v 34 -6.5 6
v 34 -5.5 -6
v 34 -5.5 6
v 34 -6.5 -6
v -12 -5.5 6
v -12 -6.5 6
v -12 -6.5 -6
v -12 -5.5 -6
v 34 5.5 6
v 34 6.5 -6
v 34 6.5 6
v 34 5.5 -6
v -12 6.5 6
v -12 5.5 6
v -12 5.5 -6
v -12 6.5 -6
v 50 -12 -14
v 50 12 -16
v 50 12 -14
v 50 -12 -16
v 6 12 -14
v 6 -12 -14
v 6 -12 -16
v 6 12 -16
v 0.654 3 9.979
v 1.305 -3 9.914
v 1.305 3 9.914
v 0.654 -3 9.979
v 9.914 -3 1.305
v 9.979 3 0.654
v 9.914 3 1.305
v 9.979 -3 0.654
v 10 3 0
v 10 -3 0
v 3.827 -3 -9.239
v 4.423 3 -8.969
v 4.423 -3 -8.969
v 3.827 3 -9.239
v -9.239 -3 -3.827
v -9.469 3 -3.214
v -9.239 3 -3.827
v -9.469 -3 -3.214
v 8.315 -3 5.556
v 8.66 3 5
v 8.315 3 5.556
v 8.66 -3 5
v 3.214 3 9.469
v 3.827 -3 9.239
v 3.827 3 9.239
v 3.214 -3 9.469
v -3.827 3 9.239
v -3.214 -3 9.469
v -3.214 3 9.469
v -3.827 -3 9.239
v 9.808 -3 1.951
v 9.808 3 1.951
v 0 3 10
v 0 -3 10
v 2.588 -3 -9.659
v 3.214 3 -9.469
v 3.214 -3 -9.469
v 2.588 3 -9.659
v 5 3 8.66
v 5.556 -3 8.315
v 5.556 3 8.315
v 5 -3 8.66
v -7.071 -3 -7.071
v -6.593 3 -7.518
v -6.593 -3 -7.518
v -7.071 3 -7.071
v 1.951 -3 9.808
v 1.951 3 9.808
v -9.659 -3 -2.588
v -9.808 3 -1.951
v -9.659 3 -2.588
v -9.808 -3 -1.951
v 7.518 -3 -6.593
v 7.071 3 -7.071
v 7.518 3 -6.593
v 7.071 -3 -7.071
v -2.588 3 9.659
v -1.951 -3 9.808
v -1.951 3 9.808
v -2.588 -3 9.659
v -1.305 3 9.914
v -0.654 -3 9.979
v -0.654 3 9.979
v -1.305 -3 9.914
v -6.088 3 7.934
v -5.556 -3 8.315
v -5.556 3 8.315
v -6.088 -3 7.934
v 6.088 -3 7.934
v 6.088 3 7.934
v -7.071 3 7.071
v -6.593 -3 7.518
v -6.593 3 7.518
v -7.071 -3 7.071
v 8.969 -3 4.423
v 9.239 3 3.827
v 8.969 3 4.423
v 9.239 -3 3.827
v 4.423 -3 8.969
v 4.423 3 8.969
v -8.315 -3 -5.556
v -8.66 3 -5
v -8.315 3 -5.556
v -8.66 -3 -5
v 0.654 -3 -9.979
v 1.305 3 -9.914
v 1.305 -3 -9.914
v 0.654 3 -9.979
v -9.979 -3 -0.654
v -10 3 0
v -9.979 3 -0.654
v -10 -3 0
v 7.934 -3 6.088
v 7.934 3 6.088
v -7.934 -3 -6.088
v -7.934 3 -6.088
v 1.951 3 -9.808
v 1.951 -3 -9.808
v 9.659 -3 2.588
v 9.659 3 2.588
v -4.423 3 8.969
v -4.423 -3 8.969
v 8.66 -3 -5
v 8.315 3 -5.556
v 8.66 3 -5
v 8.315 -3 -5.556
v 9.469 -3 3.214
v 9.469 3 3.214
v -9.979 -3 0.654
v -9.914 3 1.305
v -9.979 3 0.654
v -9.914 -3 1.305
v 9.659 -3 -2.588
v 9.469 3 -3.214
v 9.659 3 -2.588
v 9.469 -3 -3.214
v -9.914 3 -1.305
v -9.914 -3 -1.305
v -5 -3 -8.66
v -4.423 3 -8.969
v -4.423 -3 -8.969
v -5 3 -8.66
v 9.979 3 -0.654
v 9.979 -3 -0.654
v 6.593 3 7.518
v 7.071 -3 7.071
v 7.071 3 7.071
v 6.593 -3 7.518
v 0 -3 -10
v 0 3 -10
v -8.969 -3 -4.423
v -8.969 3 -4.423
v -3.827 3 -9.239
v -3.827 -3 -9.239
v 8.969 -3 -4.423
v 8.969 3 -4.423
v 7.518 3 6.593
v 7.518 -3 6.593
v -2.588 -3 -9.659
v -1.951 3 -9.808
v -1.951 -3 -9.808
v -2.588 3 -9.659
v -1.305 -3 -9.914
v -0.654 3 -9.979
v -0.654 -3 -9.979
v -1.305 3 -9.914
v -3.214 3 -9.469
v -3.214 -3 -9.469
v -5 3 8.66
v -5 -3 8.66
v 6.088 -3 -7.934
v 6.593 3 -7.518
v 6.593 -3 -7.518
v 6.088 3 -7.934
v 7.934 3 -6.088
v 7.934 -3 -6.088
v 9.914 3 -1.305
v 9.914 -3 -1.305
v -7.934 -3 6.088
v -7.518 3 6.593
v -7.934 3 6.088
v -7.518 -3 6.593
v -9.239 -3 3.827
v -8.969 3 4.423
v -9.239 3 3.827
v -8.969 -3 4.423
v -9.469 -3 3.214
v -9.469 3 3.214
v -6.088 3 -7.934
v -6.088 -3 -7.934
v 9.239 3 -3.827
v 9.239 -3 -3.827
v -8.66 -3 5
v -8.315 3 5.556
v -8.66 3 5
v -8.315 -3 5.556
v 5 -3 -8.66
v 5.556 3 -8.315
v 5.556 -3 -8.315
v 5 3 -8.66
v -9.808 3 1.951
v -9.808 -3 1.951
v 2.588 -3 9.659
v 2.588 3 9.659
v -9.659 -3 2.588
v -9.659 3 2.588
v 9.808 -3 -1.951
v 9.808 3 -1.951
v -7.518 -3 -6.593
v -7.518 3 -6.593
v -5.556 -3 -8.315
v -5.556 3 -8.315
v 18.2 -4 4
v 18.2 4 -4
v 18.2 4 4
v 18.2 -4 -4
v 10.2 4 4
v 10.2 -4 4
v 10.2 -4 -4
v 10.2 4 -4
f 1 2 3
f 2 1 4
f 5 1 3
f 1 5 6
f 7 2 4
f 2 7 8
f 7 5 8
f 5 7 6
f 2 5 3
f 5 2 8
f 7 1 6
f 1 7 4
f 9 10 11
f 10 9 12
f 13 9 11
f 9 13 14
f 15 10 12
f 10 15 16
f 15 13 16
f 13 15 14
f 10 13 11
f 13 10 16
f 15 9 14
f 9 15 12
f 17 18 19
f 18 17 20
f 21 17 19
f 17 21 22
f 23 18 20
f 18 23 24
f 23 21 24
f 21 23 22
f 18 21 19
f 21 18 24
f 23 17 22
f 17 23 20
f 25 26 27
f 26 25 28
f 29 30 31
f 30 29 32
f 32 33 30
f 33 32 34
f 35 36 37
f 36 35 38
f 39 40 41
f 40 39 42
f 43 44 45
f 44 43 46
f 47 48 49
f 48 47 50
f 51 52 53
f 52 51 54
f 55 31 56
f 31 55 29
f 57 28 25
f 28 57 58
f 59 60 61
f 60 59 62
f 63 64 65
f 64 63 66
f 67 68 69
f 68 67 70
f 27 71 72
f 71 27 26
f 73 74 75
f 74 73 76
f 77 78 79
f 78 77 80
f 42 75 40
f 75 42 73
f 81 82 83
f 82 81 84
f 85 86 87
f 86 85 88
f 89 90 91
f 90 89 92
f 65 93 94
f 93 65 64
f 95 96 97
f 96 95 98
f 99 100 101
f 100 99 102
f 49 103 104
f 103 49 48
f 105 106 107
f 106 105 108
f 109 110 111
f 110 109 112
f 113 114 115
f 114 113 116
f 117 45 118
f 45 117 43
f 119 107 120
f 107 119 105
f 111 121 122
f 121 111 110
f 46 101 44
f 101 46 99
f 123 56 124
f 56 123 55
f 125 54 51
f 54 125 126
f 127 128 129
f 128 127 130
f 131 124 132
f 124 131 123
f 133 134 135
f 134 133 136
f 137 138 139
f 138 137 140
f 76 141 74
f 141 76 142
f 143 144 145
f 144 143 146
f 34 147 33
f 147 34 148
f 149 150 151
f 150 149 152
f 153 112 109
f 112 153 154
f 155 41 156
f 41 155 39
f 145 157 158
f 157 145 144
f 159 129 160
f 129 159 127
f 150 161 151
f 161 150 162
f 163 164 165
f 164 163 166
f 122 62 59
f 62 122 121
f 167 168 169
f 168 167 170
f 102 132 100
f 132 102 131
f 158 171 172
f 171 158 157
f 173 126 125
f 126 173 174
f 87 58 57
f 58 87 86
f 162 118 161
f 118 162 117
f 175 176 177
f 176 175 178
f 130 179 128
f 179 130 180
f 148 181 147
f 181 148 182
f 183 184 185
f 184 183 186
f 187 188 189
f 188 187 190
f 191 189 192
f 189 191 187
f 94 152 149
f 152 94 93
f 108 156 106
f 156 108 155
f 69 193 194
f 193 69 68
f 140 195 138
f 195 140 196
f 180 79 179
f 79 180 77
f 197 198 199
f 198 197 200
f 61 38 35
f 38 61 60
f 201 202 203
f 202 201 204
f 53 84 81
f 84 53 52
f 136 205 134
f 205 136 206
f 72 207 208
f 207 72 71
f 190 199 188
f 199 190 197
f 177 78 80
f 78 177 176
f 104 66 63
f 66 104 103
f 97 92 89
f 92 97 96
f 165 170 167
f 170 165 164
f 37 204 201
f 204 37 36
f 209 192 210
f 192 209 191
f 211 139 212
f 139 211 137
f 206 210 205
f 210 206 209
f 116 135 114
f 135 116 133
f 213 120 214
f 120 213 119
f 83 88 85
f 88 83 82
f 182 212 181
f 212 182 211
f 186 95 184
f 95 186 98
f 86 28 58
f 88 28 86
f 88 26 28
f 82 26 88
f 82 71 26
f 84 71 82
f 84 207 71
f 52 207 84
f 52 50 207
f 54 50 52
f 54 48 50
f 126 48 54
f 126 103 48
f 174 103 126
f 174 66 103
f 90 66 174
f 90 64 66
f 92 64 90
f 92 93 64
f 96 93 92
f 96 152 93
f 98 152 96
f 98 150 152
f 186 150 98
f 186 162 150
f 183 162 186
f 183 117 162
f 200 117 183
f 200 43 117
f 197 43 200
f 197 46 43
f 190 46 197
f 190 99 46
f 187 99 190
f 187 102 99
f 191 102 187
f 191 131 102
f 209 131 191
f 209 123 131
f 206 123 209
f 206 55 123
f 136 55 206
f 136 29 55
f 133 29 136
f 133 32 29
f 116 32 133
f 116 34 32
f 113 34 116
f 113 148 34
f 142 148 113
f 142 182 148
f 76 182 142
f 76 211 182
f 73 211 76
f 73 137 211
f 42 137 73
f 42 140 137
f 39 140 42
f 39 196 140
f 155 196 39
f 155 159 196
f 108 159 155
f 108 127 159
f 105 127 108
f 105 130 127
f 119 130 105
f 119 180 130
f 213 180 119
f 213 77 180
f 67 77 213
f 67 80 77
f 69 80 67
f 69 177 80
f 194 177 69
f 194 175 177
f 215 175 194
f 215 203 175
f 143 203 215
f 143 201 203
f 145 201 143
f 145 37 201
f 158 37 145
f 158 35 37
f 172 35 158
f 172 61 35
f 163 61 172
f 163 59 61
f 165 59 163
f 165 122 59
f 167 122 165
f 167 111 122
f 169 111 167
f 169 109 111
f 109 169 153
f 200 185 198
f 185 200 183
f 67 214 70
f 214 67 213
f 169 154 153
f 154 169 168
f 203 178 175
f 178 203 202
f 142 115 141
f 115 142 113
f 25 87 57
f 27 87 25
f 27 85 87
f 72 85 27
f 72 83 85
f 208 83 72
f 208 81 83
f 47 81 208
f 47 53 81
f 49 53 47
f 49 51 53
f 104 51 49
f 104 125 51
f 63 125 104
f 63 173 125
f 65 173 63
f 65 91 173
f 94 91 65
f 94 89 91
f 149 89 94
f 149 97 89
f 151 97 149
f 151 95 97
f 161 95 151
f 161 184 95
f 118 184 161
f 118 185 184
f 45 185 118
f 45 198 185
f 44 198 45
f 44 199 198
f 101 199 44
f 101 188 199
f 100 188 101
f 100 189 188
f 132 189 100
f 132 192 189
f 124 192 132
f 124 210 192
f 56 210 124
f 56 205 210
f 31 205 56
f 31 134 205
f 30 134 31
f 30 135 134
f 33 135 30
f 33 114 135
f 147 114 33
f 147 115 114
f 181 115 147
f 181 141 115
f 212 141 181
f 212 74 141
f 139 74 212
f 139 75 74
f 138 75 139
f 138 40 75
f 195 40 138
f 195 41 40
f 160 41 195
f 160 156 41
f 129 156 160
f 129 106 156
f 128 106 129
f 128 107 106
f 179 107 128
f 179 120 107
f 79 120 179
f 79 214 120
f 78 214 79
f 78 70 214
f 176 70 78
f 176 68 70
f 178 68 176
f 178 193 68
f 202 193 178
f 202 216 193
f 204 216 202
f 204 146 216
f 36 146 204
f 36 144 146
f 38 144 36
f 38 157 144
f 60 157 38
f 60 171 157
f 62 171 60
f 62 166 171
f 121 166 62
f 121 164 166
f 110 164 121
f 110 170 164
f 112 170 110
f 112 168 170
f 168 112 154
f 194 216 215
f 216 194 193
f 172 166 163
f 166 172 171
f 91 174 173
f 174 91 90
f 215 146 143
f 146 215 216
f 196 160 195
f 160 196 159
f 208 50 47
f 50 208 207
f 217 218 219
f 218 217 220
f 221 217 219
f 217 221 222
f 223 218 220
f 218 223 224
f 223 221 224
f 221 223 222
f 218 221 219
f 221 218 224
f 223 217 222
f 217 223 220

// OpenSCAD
// Eccentric disk cam with a flat translating follower.
// Two-dimensional mechanism in the XZ plane; the cam rotates about +Y.
// The follower face is perpendicular to +X and moves along X.
cam_angle = 0;
agentscad_part = "all";
eccentricity = 0;
cam_radius = 10;
cam_thickness = 6;
follower_gap = 0.2;
follower_length = 8;
follower_width = 8;
follower_height = 8;
$fn = 96;

module frame_local() {
  // Base plate below the mechanism.
  translate([6, -12, -16]) cube([44, 24, 2]);
  // Two guide rails around the follower; they do not touch the cam.
  for (yy = [-6.5, 5.5]) translate([-12, yy, -6]) cube([46, 1, 12]);
}

module cam_local() {
  // Eccentric disk in the XZ plane; the shaft is omitted so the frame needs no bearing.
  rotate([90, 0, 0]) translate([eccentricity, 0, 0]) cylinder(r = cam_radius, h = cam_thickness, center = true);
}

module follower_local() {
  // Flat face at x = R + e cos(theta) + gap; block extends to +X.
  xpos = cam_radius + eccentricity * cos(cam_angle) + follower_gap;
  translate([xpos, -follower_width / 2, -follower_height / 2])
    cube([follower_length, follower_width, follower_height]);
}

module assembly() {
  if (agentscad_part == "all" || agentscad_part == "frame") frame_local();
  if (agentscad_part == "all" || agentscad_part == "cam") rotate([0, cam_angle, 0]) cam_local();
  if (agentscad_part == "all" || agentscad_part == "follower") follower_local();
}

assembly();
